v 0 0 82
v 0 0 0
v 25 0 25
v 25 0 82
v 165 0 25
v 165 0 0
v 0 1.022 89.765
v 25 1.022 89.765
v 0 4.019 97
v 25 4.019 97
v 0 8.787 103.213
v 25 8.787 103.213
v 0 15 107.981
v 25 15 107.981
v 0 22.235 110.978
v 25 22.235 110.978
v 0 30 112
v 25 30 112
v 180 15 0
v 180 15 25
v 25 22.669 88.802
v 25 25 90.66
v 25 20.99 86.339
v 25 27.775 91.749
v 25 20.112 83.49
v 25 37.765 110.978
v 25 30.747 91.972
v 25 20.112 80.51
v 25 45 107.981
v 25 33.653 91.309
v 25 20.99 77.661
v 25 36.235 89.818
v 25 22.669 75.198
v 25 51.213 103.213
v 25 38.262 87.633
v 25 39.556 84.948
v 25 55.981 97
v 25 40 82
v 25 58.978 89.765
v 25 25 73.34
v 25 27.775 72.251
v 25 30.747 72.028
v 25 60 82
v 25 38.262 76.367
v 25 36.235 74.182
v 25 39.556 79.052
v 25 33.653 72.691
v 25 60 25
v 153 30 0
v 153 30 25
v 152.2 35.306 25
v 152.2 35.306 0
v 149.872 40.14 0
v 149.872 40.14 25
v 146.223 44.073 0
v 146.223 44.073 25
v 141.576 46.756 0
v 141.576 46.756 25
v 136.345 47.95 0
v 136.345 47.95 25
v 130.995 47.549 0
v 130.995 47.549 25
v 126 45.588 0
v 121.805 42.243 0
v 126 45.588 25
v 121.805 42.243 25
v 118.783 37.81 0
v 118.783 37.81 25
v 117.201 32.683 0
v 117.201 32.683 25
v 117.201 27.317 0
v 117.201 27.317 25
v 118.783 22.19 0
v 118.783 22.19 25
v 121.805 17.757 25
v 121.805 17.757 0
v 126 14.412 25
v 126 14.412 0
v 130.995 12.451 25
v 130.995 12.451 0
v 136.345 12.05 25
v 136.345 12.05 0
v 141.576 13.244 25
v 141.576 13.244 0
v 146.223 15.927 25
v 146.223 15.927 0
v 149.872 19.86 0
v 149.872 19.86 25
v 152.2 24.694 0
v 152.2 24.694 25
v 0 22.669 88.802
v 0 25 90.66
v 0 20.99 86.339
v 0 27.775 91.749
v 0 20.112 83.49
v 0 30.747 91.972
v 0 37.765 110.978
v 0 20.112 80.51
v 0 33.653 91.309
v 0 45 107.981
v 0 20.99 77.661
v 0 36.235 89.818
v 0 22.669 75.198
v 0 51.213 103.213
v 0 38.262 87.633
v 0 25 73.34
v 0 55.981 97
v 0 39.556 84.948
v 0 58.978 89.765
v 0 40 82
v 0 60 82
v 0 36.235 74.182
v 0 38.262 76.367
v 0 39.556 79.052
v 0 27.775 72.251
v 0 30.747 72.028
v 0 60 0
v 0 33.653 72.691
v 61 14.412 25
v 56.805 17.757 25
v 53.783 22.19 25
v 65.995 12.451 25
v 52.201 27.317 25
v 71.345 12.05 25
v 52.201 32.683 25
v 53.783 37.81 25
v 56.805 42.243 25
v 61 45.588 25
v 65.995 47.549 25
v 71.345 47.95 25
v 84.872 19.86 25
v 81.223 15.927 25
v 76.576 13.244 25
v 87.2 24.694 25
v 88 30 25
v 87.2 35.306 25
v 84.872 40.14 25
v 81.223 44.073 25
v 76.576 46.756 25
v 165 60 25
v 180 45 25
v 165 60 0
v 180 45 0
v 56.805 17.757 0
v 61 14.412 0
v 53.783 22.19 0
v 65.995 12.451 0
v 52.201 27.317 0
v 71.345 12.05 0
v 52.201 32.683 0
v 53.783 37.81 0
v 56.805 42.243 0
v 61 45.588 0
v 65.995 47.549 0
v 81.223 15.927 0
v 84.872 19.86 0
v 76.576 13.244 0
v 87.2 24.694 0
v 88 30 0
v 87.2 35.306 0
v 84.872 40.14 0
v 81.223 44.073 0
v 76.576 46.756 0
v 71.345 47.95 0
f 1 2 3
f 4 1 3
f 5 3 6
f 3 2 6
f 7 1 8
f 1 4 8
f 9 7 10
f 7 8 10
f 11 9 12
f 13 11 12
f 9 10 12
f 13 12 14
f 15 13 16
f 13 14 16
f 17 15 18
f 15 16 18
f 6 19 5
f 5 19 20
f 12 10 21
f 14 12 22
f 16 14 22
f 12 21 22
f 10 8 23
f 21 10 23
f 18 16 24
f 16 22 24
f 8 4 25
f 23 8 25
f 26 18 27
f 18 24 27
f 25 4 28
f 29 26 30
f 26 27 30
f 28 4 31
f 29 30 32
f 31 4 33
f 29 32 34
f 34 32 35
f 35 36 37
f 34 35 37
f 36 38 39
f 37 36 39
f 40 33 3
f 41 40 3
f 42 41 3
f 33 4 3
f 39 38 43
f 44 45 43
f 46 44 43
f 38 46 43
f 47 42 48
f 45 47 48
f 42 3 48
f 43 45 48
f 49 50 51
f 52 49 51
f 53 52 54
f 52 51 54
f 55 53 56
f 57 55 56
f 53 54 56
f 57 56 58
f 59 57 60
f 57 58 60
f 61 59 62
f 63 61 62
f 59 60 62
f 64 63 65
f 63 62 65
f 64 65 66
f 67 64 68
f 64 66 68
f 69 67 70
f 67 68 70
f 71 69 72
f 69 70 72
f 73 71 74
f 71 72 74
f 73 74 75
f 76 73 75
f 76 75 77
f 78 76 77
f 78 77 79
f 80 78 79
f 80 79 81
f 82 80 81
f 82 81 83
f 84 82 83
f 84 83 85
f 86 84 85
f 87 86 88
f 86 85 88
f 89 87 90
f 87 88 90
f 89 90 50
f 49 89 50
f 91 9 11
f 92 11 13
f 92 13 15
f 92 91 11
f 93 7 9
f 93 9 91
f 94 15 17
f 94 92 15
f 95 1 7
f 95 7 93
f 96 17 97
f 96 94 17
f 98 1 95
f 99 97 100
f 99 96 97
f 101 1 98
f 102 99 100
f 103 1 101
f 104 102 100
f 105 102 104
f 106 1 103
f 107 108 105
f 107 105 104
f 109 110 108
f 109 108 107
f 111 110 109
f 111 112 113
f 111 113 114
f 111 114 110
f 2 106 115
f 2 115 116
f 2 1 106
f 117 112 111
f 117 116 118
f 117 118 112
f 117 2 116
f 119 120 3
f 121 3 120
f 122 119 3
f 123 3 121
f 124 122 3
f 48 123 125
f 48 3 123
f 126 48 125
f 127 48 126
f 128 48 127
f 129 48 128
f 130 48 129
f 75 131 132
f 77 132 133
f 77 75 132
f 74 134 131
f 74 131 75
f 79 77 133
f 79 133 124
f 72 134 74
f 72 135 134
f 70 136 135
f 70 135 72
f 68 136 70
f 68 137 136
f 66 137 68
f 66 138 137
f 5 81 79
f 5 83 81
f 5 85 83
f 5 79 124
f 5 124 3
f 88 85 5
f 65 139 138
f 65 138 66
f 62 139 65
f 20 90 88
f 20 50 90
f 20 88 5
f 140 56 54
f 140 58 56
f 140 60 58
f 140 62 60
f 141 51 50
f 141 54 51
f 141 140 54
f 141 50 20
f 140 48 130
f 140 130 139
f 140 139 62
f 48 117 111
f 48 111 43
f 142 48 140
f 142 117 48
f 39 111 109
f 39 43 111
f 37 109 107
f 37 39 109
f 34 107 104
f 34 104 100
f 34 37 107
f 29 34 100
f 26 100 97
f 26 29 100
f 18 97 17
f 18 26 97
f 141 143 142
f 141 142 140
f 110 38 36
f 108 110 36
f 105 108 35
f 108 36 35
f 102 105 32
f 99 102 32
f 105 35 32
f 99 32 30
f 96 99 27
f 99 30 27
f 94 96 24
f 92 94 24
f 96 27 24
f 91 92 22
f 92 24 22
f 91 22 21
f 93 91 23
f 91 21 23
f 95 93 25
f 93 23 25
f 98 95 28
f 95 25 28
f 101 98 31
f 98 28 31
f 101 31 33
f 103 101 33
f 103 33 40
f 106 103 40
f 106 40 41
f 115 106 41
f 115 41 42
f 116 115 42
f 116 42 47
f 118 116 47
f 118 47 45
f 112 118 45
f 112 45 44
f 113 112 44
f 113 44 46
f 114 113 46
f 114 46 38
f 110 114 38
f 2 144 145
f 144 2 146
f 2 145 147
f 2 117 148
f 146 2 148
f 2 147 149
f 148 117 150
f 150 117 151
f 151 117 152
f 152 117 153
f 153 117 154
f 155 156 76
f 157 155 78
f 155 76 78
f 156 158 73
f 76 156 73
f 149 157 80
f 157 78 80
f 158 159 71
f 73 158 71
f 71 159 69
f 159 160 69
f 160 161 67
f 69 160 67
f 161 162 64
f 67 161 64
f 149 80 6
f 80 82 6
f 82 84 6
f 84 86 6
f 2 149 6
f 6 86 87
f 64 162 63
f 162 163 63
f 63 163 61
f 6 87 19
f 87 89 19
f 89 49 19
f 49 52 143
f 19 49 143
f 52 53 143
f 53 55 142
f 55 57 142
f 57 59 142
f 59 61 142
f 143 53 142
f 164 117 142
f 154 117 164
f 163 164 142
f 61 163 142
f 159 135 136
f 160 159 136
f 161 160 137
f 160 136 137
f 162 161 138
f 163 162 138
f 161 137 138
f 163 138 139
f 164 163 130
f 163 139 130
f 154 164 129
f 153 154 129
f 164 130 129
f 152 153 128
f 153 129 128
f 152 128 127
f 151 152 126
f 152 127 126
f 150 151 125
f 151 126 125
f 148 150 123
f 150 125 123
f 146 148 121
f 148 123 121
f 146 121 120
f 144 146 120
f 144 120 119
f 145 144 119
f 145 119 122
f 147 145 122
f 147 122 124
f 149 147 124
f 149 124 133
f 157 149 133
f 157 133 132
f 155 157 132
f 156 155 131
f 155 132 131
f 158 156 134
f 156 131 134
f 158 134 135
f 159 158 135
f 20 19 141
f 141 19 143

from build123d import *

# Parameters (mm, degrees)
F0_W     = 180
F0_H     = 60
F1_DEPTH = 25
F2_W     = 25
F2_H     = 60
F3_DEPTH = 87
F4_R     = 29.99999
F5_SIZE  = 15
F6_R     = 18
F7_DEPTH = 25
F8_R     = 10
F9_DEPTH = 25.001


# Not quite as in the source:
# - a fillet or chamfer is up to 0.001 mm smaller than in the source, because OpenCascade refuses the exact size


with BuildPart() as f1:
    # F0 (on Top) → F1 (new body)
    with BuildSketch(Plane.XY):
        with Locations((90, 30)):
            Rectangle(F0_W, F0_H)
    extrude(amount=F1_DEPTH)

    # F2 (on face) → F3 (join)
    with BuildSketch(Plane.XY.offset(25)):
        with Locations((12.5, 30)):
            Rectangle(F2_W, F2_H)
    extrude(amount=F3_DEPTH)

    # F4 (radius 30 in the source; OpenCascade refuses exactly that, so slightly less here)
    f4_edges = [f1.edges().sort_by_distance(p)[0] for p in [
        (12.5, 0, 112),
        (12.5, 60, 112),
    ]]
    fillet(f4_edges, radius=F4_R)

    # F5
    f5_edges = [f1.edges().sort_by_distance(p)[0] for p in [
        (180, 0, 12.5),
        (180, 60, 12.5),
    ]]
    chamfer(f5_edges, length=F5_SIZE)

    # F6 (on face) → F7 (cut)
    with BuildSketch(Plane.XY.offset(25)):
        with Locations((70, 30)):
            Circle(F6_R)
        with Locations((135, 30)):
            Circle(F6_R)
    extrude(amount=-F7_DEPTH, mode=Mode.SUBTRACT)

    # F8 (on face) → F9 (cut, through all)
    with BuildSketch(Plane.YZ.offset(25)):
        with Locations((30, 82)):
            Circle(F8_R)
    extrude(amount=-F9_DEPTH, mode=Mode.SUBTRACT)


solid = f1.part
